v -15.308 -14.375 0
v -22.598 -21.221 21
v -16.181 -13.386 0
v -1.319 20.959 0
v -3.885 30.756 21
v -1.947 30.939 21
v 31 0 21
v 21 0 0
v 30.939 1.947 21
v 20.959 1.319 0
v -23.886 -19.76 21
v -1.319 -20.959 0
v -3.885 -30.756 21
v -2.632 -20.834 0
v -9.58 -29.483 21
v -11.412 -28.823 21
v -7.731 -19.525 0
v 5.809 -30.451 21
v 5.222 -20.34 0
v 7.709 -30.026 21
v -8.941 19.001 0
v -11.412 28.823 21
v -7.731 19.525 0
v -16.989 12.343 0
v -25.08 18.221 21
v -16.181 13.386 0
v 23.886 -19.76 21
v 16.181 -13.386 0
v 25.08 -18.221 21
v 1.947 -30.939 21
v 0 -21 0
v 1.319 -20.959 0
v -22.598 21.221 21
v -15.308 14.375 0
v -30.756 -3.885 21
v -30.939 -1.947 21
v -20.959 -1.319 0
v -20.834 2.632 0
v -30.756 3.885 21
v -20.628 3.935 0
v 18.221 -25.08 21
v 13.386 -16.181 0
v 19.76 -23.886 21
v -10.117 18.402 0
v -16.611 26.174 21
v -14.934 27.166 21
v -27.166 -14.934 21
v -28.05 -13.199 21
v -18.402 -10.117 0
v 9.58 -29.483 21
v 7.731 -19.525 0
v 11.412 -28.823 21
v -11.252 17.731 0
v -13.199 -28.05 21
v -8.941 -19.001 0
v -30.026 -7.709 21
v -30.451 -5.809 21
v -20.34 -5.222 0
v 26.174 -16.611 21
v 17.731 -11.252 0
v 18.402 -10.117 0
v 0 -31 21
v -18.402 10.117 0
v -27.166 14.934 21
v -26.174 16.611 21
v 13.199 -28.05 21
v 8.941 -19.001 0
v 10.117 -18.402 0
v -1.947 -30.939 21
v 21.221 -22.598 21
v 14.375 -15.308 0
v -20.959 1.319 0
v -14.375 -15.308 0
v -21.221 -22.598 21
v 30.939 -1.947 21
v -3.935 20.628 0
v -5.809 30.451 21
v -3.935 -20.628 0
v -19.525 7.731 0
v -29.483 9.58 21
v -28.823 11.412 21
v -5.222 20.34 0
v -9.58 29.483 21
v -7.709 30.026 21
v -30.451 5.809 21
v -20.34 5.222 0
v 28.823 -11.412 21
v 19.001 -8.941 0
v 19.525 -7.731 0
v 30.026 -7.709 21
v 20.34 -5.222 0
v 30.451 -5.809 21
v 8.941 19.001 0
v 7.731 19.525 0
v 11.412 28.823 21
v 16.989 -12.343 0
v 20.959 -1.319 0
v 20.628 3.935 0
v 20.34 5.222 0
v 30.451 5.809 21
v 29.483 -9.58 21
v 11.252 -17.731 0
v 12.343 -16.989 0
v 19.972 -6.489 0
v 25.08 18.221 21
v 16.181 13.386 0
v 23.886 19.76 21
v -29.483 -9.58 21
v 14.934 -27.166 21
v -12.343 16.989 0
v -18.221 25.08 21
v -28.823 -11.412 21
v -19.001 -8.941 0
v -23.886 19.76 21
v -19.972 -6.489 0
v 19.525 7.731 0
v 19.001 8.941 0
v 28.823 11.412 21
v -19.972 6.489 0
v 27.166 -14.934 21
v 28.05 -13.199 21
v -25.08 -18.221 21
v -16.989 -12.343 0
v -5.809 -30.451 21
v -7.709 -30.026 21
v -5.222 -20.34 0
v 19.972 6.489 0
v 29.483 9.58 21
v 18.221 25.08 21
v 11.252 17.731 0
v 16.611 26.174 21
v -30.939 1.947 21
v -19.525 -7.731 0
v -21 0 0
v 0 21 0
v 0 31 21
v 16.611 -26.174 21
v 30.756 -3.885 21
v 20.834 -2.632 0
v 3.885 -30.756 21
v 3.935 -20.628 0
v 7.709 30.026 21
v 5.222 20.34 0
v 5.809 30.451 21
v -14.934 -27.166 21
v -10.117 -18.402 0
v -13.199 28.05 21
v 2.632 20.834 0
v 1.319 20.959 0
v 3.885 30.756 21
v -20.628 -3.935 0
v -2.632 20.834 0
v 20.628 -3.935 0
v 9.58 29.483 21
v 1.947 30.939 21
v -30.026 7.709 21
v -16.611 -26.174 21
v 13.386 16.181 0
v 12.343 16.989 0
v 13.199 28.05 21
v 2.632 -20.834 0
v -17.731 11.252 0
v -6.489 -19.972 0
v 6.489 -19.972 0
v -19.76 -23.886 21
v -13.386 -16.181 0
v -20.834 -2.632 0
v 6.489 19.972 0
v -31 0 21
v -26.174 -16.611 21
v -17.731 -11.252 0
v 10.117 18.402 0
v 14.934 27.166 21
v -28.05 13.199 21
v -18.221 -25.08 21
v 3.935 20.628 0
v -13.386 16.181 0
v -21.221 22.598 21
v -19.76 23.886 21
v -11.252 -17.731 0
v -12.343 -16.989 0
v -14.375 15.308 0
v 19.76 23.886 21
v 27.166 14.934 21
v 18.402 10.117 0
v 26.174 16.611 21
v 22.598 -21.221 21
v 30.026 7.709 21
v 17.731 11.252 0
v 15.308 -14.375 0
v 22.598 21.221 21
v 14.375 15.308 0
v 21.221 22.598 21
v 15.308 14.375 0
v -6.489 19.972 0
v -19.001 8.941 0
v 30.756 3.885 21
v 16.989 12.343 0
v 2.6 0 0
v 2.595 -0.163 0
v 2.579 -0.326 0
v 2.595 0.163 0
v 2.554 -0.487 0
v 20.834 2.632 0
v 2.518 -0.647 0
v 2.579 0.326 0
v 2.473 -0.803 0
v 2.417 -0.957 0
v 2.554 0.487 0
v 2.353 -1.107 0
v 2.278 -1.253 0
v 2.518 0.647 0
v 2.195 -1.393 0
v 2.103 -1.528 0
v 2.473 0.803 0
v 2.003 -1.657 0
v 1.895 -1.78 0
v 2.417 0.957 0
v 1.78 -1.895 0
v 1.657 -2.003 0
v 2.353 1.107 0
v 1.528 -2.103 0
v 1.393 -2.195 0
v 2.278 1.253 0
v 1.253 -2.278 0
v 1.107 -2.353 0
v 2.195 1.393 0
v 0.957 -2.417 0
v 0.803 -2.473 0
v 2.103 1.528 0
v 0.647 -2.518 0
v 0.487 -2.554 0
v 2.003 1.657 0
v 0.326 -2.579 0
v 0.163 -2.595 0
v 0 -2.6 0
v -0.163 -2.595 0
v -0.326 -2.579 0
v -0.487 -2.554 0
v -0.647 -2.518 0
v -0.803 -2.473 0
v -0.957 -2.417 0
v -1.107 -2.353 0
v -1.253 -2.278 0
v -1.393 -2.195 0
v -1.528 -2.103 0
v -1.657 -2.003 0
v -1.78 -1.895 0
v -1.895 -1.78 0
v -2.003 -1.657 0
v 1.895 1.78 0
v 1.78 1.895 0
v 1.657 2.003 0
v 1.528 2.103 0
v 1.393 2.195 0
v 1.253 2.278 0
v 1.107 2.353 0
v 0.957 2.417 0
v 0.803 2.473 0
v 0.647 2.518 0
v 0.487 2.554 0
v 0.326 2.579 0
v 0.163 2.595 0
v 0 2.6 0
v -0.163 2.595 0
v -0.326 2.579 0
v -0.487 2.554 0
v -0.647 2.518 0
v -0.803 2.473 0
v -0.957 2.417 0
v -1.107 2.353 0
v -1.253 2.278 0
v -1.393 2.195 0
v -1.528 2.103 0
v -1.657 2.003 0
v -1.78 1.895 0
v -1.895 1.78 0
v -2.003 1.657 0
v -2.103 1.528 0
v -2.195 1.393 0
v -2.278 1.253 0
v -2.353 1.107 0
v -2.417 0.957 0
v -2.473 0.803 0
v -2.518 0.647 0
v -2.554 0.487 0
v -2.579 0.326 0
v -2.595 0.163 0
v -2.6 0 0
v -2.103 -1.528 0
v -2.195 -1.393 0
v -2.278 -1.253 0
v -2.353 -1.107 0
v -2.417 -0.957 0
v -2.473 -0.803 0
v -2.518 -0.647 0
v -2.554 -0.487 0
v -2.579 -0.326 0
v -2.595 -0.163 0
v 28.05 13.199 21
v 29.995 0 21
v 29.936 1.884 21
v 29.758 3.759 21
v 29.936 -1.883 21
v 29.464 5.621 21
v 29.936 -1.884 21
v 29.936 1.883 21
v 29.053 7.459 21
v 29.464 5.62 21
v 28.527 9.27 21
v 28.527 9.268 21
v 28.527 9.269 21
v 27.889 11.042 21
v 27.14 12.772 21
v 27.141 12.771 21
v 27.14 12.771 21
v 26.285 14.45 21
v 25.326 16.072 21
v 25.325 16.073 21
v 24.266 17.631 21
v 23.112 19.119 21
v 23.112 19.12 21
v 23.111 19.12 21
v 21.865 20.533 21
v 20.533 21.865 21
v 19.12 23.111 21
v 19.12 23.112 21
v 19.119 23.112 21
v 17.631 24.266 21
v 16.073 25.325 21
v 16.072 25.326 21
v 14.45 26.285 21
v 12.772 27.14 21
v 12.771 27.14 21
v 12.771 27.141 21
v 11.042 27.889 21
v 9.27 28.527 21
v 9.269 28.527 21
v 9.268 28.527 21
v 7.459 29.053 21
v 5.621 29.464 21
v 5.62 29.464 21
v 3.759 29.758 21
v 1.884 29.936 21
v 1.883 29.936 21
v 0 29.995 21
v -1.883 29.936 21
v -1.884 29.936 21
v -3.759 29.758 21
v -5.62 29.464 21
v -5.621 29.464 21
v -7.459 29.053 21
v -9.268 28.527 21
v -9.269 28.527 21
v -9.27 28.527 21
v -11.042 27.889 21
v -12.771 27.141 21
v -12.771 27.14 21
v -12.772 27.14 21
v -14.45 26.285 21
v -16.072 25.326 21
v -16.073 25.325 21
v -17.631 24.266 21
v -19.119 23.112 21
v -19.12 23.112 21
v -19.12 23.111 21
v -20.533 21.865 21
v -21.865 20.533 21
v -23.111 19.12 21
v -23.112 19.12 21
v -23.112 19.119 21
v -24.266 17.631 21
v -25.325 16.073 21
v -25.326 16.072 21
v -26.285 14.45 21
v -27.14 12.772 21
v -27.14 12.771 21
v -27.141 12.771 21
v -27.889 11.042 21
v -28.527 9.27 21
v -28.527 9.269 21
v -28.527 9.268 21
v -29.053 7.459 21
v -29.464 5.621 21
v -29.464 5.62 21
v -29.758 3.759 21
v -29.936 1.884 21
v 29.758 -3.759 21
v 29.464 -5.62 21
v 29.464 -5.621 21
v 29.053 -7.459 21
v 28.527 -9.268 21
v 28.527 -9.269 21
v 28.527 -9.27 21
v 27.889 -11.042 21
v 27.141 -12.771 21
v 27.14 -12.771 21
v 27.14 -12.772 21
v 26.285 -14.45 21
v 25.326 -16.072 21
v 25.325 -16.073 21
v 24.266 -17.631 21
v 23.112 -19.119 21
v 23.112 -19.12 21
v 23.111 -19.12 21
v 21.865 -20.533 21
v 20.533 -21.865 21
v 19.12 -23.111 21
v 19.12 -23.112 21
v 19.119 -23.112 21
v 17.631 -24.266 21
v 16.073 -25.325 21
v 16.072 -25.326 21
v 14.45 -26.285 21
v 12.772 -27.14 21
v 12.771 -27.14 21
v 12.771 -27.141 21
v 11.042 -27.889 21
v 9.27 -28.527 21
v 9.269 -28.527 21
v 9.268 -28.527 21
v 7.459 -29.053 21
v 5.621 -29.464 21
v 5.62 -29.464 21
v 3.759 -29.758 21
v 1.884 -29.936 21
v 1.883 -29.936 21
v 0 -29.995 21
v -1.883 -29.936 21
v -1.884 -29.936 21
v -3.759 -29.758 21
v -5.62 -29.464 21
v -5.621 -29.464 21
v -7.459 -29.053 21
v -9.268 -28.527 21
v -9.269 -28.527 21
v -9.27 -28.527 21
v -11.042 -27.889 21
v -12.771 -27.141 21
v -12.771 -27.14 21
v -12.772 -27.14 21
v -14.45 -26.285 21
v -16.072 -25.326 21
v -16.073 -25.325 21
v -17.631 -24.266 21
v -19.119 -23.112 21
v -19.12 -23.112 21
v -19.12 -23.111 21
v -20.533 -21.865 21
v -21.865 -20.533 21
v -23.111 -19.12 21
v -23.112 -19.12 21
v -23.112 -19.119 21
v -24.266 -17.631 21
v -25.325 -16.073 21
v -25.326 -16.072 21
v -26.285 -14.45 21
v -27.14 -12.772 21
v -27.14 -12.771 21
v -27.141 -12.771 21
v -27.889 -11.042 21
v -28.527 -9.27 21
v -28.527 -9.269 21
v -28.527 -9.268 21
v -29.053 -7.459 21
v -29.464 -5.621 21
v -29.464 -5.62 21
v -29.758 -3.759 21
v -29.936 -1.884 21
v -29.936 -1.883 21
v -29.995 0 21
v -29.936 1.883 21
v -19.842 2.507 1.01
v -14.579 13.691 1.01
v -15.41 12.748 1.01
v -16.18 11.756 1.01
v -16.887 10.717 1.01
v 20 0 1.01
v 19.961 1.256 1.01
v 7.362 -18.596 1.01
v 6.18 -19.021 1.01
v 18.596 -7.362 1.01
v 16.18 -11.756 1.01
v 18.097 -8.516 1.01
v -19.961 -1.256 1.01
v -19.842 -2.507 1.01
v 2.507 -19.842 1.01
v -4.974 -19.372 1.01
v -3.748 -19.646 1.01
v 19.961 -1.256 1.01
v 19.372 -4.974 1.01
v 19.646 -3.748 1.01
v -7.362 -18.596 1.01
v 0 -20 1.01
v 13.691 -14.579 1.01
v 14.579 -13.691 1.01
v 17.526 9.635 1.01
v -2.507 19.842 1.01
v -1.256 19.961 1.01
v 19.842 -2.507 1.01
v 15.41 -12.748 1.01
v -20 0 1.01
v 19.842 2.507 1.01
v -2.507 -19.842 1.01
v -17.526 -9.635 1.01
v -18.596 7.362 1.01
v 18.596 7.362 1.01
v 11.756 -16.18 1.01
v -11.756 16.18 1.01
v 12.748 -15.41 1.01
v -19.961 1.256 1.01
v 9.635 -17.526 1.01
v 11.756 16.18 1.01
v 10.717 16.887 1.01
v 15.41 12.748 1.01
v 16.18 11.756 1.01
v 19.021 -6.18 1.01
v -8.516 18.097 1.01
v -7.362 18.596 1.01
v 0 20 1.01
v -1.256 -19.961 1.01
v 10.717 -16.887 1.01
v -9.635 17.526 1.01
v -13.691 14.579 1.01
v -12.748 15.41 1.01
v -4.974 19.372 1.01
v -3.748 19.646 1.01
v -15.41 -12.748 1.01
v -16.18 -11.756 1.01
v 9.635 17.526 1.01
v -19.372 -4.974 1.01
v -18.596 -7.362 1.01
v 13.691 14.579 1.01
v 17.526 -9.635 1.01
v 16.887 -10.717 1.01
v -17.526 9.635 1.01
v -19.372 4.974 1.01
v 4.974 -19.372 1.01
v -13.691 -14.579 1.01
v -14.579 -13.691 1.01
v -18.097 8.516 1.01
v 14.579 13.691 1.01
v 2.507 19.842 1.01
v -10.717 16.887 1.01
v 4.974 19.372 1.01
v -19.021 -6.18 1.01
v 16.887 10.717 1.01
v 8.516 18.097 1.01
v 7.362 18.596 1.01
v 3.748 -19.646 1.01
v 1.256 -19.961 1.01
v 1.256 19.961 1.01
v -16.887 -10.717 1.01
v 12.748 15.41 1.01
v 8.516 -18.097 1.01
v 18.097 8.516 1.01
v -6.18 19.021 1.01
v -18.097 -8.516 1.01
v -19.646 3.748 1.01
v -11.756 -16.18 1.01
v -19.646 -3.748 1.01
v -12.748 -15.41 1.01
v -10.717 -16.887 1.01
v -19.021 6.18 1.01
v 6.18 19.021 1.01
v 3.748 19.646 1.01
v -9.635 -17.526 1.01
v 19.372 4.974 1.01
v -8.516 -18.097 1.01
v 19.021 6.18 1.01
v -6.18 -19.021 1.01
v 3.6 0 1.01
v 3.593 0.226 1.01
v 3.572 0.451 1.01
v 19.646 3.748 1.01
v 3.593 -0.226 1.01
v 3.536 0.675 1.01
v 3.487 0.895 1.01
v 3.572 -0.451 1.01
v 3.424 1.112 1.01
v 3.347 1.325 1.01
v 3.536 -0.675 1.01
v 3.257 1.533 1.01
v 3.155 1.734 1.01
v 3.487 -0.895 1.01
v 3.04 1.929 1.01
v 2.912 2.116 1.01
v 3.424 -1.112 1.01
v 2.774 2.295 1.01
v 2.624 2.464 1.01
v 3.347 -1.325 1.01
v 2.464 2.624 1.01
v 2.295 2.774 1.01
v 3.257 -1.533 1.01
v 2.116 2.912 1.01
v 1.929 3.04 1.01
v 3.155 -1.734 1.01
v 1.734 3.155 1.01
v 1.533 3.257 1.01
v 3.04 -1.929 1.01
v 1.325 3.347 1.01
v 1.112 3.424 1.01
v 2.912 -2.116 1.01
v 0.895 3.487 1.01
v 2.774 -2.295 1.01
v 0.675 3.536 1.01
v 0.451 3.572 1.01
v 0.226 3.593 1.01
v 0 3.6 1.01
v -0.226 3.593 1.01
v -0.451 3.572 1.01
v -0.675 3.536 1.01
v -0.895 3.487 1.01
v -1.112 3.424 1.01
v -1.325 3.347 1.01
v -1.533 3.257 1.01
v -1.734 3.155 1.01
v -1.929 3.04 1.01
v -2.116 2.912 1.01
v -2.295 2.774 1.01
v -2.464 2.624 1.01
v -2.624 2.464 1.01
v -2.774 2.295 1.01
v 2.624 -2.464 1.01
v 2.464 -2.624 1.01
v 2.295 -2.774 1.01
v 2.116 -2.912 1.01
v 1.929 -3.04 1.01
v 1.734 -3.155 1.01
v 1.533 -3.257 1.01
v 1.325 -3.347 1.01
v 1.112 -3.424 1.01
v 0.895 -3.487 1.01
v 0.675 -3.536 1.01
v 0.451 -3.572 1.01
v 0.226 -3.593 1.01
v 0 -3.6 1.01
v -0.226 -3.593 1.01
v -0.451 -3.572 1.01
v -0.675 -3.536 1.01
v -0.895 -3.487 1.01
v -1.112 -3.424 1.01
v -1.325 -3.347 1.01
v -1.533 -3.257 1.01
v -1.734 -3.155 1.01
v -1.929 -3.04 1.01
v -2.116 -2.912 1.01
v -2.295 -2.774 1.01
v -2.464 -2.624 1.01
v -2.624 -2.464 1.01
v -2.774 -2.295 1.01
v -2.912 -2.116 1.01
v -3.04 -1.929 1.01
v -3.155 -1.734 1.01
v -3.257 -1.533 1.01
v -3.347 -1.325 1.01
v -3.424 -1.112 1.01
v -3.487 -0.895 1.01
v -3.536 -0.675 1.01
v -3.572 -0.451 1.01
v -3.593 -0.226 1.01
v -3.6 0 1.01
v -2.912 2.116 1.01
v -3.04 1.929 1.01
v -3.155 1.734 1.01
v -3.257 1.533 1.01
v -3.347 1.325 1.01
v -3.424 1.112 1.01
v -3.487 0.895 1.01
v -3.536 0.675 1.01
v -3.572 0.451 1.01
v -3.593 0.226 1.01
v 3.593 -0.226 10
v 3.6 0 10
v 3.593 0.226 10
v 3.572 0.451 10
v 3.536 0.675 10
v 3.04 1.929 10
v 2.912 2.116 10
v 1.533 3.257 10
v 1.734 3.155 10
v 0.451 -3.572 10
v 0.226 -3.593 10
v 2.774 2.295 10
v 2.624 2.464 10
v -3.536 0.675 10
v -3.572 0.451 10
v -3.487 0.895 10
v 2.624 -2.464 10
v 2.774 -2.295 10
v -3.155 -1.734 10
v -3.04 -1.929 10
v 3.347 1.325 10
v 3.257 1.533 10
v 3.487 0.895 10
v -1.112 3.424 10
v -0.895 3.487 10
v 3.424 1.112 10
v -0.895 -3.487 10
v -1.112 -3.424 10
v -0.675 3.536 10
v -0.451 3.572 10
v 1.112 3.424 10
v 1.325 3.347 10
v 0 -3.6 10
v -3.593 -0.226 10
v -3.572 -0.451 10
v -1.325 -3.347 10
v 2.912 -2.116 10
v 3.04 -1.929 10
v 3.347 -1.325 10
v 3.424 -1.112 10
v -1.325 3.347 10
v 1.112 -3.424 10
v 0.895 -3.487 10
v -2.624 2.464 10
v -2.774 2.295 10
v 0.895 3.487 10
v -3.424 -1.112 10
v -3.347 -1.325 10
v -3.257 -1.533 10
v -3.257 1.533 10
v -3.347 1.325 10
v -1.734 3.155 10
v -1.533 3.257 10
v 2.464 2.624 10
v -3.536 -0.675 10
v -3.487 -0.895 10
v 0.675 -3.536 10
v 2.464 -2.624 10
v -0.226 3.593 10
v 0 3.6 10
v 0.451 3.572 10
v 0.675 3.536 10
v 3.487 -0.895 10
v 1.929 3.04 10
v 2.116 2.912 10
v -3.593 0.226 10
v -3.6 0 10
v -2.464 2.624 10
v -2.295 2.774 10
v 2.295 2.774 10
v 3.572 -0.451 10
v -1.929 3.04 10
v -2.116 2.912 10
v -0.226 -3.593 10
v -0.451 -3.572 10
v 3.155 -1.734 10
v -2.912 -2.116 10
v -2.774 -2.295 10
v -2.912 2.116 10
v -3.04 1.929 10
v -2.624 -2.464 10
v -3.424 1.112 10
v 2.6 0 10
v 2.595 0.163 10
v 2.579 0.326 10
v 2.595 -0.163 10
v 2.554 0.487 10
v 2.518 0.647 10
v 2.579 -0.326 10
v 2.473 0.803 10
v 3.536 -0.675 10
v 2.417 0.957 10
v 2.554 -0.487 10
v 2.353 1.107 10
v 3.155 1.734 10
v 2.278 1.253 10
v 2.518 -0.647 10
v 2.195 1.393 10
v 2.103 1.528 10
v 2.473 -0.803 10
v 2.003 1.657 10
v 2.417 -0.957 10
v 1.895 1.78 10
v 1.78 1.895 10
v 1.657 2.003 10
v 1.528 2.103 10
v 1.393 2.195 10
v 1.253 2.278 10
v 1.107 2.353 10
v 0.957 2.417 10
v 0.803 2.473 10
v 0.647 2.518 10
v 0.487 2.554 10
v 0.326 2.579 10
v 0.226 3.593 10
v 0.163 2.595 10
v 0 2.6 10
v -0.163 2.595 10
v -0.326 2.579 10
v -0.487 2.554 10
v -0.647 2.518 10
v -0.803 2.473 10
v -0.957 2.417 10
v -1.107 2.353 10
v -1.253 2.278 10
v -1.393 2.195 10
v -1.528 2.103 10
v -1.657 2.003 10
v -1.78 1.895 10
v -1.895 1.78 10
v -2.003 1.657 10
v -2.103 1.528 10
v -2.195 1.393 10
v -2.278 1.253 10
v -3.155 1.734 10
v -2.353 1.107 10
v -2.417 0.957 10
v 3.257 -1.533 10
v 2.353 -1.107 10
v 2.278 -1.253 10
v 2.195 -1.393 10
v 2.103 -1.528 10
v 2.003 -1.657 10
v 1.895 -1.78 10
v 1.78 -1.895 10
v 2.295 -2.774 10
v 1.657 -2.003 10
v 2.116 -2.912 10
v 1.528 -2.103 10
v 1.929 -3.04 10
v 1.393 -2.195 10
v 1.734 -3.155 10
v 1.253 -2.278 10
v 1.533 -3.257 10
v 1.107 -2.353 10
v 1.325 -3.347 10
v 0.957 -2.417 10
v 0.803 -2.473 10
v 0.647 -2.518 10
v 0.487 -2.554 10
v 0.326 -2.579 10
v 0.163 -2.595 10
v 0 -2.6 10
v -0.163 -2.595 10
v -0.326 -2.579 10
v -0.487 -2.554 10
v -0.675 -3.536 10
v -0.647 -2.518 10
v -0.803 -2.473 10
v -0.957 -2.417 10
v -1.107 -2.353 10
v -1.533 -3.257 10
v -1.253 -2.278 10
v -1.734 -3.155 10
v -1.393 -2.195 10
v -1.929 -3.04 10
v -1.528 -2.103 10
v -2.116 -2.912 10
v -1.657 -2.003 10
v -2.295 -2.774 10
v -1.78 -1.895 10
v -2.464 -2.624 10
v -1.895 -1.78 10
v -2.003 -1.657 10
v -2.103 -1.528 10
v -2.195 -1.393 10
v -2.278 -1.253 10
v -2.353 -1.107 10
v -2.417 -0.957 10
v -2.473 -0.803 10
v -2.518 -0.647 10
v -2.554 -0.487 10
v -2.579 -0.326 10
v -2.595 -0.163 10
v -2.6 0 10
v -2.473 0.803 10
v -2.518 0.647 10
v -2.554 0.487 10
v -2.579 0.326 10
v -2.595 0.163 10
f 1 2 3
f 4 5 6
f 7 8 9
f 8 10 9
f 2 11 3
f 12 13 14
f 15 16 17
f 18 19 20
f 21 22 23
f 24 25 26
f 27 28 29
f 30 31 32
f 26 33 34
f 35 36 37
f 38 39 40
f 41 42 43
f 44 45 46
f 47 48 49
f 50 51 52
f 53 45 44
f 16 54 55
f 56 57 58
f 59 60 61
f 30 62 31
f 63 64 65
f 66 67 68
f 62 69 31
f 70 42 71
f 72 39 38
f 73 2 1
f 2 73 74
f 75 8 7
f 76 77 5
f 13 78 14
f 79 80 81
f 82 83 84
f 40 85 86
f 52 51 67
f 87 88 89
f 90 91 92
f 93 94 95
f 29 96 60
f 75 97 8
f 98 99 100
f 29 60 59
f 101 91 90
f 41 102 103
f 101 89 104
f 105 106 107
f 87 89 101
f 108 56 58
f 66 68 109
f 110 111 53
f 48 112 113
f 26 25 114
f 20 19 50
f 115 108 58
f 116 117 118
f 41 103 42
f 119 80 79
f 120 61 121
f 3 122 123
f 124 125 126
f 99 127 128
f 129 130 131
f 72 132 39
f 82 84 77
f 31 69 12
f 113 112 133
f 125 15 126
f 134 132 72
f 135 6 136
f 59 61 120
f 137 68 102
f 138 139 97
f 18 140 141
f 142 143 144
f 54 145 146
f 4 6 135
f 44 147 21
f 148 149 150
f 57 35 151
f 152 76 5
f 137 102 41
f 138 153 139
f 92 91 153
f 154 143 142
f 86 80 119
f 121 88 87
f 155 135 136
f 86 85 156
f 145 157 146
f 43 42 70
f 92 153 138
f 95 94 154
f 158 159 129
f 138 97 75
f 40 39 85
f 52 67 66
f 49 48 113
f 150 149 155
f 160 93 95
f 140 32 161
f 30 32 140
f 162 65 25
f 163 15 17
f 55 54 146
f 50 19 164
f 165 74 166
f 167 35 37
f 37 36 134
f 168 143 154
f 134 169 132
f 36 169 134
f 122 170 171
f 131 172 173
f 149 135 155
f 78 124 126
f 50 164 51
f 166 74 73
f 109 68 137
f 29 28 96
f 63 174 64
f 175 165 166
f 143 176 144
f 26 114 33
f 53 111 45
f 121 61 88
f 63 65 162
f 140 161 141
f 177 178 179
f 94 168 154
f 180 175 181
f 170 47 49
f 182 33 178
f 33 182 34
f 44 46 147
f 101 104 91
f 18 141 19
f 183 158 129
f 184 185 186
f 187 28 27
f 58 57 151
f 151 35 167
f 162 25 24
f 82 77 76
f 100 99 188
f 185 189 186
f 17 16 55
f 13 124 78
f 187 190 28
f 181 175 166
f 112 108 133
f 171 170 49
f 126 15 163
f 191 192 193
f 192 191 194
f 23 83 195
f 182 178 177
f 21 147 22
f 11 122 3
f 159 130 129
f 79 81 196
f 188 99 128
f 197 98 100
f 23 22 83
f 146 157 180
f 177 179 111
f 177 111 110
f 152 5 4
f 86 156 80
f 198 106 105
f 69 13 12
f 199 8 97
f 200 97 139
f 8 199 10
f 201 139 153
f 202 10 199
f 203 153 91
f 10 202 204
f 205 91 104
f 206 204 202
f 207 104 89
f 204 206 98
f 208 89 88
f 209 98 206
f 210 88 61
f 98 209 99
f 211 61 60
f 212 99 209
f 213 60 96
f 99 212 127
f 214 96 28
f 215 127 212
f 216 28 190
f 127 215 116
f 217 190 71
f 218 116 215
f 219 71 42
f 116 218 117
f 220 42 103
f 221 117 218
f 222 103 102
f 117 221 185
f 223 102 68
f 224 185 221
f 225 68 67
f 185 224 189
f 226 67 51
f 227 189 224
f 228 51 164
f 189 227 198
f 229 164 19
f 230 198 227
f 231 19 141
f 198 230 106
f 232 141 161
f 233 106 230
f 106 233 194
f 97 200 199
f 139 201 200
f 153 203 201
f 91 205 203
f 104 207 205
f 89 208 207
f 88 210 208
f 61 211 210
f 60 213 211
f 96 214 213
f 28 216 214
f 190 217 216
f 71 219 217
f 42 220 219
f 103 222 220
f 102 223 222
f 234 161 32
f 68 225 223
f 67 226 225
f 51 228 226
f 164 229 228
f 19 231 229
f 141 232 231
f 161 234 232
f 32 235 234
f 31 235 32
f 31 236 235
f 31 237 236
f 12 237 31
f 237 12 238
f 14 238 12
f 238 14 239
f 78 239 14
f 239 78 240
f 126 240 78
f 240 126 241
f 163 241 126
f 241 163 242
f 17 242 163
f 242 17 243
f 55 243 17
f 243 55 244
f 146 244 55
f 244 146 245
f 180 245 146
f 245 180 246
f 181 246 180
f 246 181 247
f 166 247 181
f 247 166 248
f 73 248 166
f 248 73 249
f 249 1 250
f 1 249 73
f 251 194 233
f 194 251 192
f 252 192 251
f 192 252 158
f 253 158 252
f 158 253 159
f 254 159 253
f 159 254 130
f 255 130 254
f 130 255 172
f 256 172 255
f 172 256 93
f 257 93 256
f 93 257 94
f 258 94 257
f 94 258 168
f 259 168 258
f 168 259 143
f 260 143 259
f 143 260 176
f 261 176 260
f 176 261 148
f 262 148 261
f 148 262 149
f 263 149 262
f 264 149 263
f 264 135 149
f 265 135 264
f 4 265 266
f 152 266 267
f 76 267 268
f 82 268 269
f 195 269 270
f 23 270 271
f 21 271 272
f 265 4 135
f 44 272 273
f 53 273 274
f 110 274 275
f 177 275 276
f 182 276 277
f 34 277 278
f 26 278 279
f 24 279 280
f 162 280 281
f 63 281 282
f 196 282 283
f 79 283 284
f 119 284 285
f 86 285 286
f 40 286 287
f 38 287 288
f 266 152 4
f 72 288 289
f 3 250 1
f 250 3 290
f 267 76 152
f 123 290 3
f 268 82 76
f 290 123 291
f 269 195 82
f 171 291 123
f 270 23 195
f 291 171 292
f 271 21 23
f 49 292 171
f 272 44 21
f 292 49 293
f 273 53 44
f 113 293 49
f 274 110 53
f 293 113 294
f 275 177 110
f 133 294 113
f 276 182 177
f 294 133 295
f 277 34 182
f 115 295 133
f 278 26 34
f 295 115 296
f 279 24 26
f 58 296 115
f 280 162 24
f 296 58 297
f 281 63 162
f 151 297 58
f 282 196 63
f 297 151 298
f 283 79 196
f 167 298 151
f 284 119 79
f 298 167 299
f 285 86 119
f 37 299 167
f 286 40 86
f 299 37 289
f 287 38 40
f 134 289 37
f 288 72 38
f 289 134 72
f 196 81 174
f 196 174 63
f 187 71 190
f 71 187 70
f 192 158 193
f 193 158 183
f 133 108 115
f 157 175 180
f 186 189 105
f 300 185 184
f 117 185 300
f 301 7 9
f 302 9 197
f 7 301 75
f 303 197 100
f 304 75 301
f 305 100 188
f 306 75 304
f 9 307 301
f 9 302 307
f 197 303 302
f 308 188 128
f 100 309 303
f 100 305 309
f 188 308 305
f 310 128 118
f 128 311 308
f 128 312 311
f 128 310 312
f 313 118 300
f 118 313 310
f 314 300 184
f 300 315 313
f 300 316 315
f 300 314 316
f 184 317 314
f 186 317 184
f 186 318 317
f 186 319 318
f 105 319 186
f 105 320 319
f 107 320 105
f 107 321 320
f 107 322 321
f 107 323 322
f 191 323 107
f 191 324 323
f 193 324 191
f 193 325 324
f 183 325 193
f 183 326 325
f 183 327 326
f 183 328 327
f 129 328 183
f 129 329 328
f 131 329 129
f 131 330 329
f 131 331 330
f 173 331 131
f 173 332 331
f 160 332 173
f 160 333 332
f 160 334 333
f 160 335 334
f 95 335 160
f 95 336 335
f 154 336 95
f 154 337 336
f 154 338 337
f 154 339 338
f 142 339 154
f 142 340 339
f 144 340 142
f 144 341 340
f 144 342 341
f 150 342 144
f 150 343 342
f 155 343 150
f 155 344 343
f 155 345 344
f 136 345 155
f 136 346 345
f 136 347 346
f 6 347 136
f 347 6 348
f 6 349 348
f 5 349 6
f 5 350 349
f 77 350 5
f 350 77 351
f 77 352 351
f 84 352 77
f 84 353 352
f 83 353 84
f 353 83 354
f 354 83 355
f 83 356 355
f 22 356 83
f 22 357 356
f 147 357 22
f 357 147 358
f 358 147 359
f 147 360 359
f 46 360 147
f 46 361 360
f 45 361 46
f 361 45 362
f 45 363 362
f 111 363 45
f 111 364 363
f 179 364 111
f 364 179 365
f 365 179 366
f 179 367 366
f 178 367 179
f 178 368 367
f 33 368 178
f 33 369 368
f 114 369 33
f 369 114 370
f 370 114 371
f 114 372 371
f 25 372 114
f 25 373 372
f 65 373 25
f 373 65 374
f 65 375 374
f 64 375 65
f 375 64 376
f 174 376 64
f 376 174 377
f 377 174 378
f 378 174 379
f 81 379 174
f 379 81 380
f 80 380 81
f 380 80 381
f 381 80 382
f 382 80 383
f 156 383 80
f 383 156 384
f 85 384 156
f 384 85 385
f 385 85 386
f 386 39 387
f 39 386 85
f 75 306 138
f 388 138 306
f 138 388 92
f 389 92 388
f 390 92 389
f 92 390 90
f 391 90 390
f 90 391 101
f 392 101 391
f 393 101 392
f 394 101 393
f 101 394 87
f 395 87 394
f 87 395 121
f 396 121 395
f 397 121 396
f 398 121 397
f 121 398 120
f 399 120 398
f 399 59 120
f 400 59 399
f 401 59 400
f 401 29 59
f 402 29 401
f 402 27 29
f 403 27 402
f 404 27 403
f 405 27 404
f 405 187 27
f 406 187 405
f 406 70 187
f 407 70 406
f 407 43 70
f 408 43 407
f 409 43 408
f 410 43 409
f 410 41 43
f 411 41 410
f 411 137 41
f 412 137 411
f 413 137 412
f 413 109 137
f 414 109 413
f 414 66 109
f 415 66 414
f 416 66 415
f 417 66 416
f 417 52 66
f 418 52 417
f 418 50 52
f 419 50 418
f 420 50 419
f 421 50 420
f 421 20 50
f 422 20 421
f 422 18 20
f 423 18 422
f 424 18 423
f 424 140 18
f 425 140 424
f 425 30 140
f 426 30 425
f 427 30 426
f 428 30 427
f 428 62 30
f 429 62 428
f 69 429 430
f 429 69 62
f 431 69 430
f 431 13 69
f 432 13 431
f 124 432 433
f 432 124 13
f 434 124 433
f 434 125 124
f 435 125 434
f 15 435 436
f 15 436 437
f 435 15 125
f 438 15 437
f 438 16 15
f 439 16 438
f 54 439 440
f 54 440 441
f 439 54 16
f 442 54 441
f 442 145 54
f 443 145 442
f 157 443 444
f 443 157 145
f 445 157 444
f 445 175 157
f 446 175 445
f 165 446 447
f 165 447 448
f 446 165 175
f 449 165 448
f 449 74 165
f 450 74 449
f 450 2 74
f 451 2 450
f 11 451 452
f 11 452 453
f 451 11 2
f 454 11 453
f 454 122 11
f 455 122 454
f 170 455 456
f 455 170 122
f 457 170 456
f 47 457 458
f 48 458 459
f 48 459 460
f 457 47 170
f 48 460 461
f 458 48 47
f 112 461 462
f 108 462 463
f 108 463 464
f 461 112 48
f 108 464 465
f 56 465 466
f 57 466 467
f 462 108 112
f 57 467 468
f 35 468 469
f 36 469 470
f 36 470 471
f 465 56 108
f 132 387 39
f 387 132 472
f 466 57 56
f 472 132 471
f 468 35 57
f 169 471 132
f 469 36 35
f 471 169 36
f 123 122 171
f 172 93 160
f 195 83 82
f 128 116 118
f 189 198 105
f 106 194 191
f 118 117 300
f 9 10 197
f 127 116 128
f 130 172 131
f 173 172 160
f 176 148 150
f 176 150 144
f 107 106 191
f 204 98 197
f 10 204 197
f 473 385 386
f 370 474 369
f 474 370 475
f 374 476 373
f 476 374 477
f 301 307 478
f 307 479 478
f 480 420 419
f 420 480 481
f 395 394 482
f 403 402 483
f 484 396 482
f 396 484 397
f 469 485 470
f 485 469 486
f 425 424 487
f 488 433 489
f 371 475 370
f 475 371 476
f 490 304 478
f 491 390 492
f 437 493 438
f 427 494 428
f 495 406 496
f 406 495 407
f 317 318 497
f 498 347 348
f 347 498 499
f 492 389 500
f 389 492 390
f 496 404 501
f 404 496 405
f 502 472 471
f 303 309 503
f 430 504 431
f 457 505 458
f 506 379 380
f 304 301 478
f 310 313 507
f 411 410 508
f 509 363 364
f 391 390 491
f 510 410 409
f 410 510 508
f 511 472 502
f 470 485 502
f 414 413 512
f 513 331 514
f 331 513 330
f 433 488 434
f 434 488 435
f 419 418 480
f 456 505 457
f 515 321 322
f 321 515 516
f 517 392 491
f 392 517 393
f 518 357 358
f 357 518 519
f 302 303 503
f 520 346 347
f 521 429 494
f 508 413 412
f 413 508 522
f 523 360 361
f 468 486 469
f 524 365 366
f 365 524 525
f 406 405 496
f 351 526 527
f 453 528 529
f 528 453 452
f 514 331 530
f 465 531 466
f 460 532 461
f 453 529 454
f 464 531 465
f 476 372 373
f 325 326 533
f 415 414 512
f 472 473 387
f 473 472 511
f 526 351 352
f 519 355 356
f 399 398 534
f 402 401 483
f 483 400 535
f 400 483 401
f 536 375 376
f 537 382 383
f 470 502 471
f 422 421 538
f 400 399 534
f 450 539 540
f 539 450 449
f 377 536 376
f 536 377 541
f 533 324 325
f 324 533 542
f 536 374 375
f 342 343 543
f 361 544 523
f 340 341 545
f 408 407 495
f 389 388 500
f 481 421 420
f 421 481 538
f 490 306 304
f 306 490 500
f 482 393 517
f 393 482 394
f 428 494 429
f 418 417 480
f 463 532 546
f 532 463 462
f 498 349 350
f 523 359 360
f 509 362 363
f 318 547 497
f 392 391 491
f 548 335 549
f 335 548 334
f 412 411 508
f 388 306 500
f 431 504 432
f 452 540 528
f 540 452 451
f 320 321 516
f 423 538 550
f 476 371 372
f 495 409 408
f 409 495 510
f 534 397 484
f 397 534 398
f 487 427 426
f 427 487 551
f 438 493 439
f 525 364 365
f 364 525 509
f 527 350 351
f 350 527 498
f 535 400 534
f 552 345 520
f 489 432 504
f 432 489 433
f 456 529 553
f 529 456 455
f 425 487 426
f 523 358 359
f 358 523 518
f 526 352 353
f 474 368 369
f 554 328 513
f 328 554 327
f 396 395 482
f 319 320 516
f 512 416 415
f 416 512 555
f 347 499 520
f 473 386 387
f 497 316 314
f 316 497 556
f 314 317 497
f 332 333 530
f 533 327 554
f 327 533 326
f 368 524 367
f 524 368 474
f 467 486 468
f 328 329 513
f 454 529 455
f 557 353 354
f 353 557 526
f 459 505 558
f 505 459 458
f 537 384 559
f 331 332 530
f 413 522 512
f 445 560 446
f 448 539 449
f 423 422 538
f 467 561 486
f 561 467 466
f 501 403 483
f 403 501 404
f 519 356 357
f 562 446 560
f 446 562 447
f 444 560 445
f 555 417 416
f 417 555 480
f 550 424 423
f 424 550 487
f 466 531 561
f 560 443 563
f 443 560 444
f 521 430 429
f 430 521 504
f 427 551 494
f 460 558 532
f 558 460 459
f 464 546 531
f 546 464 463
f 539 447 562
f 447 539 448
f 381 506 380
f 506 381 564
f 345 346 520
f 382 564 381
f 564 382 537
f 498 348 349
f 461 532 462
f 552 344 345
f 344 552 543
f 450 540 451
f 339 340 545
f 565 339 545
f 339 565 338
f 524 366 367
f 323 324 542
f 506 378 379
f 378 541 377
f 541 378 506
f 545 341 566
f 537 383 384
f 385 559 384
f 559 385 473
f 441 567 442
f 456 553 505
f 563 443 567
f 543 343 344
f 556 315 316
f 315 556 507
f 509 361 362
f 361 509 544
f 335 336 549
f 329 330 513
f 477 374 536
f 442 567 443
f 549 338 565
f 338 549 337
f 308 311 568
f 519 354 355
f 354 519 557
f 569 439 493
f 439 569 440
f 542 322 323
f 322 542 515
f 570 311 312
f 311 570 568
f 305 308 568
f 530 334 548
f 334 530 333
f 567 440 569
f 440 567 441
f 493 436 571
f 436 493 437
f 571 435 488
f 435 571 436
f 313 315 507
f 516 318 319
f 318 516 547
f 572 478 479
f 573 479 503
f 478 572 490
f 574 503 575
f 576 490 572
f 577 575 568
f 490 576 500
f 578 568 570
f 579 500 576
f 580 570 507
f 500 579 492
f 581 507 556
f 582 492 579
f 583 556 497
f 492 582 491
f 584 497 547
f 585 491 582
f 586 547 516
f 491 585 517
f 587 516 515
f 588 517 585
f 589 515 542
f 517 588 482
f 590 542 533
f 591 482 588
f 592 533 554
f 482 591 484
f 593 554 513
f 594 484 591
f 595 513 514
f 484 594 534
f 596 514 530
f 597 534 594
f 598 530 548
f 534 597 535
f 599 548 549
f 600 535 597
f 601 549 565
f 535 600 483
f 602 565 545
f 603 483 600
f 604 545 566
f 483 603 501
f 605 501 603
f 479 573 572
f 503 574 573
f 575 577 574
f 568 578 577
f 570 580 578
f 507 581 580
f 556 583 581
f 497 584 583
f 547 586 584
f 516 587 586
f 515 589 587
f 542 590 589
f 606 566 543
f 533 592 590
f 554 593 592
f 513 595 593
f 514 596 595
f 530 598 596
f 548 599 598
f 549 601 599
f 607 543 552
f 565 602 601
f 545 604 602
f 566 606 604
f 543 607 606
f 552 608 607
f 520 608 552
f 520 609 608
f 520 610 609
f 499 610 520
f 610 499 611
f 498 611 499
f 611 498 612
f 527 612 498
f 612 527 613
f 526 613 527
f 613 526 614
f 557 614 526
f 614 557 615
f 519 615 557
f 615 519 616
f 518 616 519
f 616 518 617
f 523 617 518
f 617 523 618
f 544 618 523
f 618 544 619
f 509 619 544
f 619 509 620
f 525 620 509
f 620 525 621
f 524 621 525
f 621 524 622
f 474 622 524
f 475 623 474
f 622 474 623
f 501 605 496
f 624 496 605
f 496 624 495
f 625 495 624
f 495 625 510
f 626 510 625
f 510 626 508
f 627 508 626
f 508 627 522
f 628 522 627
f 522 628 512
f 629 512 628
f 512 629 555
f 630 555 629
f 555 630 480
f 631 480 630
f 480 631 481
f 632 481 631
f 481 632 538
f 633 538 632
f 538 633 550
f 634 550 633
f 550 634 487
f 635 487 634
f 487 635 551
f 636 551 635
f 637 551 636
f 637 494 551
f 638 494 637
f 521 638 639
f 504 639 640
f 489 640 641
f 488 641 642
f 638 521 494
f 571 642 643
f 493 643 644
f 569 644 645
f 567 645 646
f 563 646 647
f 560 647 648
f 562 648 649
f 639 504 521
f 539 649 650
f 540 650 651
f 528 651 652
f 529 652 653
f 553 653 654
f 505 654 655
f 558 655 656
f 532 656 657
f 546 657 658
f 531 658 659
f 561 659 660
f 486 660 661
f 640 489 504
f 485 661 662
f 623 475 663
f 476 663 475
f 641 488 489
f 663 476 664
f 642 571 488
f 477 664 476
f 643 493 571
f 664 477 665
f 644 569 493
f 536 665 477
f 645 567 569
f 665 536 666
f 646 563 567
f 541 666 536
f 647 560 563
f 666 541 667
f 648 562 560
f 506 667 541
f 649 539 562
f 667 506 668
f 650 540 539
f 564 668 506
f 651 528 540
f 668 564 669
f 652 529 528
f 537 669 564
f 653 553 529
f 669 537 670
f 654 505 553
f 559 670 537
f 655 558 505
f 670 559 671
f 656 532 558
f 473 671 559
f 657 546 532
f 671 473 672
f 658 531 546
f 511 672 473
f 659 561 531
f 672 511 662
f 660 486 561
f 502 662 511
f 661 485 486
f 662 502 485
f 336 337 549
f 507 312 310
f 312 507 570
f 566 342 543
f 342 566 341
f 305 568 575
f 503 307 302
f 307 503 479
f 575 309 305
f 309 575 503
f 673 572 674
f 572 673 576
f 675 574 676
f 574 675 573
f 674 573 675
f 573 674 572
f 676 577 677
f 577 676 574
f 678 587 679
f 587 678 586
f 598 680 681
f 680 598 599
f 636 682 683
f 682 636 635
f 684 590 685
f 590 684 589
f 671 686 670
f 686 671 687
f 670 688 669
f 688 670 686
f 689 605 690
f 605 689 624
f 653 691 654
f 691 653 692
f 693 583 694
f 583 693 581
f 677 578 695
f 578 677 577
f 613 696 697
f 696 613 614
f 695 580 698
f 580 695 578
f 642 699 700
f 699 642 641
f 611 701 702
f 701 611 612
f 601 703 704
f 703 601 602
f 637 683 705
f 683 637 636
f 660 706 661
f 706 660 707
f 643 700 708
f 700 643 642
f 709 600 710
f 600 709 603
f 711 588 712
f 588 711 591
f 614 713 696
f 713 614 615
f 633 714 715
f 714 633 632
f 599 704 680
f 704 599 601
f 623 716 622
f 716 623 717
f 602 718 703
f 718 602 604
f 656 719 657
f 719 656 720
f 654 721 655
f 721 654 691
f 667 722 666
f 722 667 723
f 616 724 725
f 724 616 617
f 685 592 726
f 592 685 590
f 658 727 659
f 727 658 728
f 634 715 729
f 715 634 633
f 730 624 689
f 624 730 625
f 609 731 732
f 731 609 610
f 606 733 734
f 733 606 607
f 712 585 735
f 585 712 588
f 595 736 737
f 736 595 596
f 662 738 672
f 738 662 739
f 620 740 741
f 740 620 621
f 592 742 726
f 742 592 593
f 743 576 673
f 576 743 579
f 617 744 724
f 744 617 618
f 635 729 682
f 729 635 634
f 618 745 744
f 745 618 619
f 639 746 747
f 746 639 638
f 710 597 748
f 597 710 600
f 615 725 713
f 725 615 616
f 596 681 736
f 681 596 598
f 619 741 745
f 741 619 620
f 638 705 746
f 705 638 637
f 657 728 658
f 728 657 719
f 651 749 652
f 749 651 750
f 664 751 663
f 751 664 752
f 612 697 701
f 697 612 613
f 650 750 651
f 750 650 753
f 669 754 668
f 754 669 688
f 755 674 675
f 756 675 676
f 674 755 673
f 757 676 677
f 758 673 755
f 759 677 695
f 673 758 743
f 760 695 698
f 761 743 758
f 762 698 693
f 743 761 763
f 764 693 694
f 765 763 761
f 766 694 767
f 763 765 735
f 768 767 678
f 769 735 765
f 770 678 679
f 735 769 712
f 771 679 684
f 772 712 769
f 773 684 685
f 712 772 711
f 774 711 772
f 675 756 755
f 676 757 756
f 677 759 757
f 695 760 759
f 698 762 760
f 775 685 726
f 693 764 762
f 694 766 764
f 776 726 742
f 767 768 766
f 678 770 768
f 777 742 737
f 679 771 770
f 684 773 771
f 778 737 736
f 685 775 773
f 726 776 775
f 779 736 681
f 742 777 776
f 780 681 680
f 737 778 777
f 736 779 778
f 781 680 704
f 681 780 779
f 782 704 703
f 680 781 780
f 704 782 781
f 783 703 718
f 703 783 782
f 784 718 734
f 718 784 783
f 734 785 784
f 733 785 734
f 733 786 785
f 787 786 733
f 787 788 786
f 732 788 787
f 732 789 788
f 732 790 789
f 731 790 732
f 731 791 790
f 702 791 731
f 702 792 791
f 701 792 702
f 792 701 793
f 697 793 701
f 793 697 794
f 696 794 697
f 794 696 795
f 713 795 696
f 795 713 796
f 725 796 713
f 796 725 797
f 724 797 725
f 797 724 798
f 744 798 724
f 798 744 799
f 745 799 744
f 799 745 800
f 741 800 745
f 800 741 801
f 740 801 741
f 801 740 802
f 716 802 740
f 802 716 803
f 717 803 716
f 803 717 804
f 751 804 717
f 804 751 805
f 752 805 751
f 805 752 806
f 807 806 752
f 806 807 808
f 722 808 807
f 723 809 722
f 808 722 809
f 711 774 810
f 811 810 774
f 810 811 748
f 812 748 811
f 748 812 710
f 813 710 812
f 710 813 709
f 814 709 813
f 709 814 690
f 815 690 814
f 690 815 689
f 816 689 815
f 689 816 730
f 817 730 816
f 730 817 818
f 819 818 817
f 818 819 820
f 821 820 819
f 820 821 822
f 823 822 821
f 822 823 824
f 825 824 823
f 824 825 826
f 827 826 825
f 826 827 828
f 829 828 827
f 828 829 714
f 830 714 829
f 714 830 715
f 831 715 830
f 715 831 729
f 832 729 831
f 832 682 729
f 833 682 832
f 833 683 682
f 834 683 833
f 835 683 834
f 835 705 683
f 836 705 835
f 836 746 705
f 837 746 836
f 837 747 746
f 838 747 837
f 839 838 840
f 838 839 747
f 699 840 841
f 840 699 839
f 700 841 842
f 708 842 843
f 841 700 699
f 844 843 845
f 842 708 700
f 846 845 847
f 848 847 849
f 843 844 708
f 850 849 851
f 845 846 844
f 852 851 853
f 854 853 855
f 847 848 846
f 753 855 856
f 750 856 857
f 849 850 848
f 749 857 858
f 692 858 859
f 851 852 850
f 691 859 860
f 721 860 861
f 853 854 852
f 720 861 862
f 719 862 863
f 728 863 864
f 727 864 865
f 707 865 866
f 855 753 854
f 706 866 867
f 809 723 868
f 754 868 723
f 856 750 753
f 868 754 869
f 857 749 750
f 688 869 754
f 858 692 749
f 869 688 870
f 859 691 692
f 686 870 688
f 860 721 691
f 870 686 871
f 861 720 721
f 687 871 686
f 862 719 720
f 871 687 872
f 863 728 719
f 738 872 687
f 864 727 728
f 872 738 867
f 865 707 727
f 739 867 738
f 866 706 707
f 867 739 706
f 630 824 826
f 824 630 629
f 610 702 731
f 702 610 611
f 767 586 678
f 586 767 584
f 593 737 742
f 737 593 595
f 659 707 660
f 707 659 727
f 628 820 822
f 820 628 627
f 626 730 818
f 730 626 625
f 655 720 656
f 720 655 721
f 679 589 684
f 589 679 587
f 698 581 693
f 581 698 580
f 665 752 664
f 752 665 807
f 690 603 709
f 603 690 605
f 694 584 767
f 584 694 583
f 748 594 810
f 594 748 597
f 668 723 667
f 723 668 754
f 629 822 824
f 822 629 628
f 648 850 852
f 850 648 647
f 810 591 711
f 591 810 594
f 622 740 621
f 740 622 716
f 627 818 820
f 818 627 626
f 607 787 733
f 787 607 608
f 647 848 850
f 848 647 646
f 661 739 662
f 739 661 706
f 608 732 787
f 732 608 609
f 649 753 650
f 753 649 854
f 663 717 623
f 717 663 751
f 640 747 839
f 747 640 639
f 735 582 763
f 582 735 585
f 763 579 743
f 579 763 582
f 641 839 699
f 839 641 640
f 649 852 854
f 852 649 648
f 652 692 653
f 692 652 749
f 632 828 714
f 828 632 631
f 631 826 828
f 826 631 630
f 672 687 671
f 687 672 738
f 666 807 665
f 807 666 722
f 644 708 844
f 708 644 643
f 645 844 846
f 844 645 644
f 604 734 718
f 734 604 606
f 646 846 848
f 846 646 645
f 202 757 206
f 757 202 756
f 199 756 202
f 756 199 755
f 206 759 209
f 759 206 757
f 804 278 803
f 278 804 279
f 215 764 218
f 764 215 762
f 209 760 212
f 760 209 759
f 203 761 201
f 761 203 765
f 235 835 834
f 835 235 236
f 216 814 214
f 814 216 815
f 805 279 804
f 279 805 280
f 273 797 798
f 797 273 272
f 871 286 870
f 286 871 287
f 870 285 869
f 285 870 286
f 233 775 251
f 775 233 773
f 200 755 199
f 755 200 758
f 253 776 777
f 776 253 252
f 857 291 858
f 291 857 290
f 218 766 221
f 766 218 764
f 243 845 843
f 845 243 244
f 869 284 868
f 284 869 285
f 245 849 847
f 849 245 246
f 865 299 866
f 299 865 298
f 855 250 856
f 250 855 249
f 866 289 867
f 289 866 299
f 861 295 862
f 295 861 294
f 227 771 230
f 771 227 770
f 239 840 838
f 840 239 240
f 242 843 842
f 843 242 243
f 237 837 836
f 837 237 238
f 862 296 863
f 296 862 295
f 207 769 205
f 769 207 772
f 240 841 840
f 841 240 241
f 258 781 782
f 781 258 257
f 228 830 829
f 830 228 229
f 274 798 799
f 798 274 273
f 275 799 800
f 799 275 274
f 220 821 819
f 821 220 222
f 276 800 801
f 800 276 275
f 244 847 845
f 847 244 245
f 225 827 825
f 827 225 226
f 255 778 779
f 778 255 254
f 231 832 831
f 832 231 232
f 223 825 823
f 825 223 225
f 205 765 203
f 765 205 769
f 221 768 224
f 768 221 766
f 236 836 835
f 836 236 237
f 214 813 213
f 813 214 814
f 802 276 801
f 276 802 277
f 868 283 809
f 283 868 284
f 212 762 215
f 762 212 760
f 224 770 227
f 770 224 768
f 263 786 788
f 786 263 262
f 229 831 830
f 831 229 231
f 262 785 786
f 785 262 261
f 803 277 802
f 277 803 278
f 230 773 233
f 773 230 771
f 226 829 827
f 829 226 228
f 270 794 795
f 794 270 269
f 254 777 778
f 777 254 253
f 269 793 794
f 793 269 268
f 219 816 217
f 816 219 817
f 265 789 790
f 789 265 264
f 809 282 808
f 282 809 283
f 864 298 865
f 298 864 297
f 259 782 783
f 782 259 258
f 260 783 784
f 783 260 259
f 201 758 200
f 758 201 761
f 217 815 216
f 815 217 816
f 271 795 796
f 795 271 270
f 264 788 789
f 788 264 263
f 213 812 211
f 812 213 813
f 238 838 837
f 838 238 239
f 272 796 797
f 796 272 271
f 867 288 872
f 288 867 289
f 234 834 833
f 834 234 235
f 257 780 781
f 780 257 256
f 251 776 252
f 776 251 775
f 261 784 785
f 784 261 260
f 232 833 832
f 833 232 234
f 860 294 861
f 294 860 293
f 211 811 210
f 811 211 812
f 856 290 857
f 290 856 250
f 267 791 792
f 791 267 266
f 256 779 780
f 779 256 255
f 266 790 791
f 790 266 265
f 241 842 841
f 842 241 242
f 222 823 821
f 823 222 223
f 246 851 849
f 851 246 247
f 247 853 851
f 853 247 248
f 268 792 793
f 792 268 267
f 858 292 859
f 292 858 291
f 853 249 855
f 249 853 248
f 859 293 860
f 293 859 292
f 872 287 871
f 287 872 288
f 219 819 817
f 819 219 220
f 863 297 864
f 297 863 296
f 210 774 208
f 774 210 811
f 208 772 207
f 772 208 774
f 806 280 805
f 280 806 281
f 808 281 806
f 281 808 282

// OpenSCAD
// Drill Dust Collector by xifle
// Licensed under the CC BY-NC-SA 3.0
// 10.04.2017
// v1


// Height of the Dust Collector
HEIGHT=20;

// Diameter of your Drill (add some clearing, 0.1-0.2mm should be fine)
DRILL_DIA=5.2;

// Upper Diameter of the Dust Collector
UPPER_DIAMETER=60;

// Lower Diameter of the Dust Collector
LOWER_DIAMETER=40;

WALL=1;

$fn=100;

difference() {

union() {
difference() {

cylinder(r1=LOWER_DIAMETER/2+WALL, r2=UPPER_DIAMETER/2+WALL, h=HEIGHT+WALL, center=false);

translate([0,0,WALL+0.01])
cylinder(r1=LOWER_DIAMETER/2, r2=UPPER_DIAMETER/2, h=HEIGHT, center=false);

  
}

cylinder(r=DRILL_DIA/2+WALL,h=HEIGHT/2);

}

  
translate([0,0,-0.1])
cylinder(r=DRILL_DIA/2, h=HEIGHT);


}
